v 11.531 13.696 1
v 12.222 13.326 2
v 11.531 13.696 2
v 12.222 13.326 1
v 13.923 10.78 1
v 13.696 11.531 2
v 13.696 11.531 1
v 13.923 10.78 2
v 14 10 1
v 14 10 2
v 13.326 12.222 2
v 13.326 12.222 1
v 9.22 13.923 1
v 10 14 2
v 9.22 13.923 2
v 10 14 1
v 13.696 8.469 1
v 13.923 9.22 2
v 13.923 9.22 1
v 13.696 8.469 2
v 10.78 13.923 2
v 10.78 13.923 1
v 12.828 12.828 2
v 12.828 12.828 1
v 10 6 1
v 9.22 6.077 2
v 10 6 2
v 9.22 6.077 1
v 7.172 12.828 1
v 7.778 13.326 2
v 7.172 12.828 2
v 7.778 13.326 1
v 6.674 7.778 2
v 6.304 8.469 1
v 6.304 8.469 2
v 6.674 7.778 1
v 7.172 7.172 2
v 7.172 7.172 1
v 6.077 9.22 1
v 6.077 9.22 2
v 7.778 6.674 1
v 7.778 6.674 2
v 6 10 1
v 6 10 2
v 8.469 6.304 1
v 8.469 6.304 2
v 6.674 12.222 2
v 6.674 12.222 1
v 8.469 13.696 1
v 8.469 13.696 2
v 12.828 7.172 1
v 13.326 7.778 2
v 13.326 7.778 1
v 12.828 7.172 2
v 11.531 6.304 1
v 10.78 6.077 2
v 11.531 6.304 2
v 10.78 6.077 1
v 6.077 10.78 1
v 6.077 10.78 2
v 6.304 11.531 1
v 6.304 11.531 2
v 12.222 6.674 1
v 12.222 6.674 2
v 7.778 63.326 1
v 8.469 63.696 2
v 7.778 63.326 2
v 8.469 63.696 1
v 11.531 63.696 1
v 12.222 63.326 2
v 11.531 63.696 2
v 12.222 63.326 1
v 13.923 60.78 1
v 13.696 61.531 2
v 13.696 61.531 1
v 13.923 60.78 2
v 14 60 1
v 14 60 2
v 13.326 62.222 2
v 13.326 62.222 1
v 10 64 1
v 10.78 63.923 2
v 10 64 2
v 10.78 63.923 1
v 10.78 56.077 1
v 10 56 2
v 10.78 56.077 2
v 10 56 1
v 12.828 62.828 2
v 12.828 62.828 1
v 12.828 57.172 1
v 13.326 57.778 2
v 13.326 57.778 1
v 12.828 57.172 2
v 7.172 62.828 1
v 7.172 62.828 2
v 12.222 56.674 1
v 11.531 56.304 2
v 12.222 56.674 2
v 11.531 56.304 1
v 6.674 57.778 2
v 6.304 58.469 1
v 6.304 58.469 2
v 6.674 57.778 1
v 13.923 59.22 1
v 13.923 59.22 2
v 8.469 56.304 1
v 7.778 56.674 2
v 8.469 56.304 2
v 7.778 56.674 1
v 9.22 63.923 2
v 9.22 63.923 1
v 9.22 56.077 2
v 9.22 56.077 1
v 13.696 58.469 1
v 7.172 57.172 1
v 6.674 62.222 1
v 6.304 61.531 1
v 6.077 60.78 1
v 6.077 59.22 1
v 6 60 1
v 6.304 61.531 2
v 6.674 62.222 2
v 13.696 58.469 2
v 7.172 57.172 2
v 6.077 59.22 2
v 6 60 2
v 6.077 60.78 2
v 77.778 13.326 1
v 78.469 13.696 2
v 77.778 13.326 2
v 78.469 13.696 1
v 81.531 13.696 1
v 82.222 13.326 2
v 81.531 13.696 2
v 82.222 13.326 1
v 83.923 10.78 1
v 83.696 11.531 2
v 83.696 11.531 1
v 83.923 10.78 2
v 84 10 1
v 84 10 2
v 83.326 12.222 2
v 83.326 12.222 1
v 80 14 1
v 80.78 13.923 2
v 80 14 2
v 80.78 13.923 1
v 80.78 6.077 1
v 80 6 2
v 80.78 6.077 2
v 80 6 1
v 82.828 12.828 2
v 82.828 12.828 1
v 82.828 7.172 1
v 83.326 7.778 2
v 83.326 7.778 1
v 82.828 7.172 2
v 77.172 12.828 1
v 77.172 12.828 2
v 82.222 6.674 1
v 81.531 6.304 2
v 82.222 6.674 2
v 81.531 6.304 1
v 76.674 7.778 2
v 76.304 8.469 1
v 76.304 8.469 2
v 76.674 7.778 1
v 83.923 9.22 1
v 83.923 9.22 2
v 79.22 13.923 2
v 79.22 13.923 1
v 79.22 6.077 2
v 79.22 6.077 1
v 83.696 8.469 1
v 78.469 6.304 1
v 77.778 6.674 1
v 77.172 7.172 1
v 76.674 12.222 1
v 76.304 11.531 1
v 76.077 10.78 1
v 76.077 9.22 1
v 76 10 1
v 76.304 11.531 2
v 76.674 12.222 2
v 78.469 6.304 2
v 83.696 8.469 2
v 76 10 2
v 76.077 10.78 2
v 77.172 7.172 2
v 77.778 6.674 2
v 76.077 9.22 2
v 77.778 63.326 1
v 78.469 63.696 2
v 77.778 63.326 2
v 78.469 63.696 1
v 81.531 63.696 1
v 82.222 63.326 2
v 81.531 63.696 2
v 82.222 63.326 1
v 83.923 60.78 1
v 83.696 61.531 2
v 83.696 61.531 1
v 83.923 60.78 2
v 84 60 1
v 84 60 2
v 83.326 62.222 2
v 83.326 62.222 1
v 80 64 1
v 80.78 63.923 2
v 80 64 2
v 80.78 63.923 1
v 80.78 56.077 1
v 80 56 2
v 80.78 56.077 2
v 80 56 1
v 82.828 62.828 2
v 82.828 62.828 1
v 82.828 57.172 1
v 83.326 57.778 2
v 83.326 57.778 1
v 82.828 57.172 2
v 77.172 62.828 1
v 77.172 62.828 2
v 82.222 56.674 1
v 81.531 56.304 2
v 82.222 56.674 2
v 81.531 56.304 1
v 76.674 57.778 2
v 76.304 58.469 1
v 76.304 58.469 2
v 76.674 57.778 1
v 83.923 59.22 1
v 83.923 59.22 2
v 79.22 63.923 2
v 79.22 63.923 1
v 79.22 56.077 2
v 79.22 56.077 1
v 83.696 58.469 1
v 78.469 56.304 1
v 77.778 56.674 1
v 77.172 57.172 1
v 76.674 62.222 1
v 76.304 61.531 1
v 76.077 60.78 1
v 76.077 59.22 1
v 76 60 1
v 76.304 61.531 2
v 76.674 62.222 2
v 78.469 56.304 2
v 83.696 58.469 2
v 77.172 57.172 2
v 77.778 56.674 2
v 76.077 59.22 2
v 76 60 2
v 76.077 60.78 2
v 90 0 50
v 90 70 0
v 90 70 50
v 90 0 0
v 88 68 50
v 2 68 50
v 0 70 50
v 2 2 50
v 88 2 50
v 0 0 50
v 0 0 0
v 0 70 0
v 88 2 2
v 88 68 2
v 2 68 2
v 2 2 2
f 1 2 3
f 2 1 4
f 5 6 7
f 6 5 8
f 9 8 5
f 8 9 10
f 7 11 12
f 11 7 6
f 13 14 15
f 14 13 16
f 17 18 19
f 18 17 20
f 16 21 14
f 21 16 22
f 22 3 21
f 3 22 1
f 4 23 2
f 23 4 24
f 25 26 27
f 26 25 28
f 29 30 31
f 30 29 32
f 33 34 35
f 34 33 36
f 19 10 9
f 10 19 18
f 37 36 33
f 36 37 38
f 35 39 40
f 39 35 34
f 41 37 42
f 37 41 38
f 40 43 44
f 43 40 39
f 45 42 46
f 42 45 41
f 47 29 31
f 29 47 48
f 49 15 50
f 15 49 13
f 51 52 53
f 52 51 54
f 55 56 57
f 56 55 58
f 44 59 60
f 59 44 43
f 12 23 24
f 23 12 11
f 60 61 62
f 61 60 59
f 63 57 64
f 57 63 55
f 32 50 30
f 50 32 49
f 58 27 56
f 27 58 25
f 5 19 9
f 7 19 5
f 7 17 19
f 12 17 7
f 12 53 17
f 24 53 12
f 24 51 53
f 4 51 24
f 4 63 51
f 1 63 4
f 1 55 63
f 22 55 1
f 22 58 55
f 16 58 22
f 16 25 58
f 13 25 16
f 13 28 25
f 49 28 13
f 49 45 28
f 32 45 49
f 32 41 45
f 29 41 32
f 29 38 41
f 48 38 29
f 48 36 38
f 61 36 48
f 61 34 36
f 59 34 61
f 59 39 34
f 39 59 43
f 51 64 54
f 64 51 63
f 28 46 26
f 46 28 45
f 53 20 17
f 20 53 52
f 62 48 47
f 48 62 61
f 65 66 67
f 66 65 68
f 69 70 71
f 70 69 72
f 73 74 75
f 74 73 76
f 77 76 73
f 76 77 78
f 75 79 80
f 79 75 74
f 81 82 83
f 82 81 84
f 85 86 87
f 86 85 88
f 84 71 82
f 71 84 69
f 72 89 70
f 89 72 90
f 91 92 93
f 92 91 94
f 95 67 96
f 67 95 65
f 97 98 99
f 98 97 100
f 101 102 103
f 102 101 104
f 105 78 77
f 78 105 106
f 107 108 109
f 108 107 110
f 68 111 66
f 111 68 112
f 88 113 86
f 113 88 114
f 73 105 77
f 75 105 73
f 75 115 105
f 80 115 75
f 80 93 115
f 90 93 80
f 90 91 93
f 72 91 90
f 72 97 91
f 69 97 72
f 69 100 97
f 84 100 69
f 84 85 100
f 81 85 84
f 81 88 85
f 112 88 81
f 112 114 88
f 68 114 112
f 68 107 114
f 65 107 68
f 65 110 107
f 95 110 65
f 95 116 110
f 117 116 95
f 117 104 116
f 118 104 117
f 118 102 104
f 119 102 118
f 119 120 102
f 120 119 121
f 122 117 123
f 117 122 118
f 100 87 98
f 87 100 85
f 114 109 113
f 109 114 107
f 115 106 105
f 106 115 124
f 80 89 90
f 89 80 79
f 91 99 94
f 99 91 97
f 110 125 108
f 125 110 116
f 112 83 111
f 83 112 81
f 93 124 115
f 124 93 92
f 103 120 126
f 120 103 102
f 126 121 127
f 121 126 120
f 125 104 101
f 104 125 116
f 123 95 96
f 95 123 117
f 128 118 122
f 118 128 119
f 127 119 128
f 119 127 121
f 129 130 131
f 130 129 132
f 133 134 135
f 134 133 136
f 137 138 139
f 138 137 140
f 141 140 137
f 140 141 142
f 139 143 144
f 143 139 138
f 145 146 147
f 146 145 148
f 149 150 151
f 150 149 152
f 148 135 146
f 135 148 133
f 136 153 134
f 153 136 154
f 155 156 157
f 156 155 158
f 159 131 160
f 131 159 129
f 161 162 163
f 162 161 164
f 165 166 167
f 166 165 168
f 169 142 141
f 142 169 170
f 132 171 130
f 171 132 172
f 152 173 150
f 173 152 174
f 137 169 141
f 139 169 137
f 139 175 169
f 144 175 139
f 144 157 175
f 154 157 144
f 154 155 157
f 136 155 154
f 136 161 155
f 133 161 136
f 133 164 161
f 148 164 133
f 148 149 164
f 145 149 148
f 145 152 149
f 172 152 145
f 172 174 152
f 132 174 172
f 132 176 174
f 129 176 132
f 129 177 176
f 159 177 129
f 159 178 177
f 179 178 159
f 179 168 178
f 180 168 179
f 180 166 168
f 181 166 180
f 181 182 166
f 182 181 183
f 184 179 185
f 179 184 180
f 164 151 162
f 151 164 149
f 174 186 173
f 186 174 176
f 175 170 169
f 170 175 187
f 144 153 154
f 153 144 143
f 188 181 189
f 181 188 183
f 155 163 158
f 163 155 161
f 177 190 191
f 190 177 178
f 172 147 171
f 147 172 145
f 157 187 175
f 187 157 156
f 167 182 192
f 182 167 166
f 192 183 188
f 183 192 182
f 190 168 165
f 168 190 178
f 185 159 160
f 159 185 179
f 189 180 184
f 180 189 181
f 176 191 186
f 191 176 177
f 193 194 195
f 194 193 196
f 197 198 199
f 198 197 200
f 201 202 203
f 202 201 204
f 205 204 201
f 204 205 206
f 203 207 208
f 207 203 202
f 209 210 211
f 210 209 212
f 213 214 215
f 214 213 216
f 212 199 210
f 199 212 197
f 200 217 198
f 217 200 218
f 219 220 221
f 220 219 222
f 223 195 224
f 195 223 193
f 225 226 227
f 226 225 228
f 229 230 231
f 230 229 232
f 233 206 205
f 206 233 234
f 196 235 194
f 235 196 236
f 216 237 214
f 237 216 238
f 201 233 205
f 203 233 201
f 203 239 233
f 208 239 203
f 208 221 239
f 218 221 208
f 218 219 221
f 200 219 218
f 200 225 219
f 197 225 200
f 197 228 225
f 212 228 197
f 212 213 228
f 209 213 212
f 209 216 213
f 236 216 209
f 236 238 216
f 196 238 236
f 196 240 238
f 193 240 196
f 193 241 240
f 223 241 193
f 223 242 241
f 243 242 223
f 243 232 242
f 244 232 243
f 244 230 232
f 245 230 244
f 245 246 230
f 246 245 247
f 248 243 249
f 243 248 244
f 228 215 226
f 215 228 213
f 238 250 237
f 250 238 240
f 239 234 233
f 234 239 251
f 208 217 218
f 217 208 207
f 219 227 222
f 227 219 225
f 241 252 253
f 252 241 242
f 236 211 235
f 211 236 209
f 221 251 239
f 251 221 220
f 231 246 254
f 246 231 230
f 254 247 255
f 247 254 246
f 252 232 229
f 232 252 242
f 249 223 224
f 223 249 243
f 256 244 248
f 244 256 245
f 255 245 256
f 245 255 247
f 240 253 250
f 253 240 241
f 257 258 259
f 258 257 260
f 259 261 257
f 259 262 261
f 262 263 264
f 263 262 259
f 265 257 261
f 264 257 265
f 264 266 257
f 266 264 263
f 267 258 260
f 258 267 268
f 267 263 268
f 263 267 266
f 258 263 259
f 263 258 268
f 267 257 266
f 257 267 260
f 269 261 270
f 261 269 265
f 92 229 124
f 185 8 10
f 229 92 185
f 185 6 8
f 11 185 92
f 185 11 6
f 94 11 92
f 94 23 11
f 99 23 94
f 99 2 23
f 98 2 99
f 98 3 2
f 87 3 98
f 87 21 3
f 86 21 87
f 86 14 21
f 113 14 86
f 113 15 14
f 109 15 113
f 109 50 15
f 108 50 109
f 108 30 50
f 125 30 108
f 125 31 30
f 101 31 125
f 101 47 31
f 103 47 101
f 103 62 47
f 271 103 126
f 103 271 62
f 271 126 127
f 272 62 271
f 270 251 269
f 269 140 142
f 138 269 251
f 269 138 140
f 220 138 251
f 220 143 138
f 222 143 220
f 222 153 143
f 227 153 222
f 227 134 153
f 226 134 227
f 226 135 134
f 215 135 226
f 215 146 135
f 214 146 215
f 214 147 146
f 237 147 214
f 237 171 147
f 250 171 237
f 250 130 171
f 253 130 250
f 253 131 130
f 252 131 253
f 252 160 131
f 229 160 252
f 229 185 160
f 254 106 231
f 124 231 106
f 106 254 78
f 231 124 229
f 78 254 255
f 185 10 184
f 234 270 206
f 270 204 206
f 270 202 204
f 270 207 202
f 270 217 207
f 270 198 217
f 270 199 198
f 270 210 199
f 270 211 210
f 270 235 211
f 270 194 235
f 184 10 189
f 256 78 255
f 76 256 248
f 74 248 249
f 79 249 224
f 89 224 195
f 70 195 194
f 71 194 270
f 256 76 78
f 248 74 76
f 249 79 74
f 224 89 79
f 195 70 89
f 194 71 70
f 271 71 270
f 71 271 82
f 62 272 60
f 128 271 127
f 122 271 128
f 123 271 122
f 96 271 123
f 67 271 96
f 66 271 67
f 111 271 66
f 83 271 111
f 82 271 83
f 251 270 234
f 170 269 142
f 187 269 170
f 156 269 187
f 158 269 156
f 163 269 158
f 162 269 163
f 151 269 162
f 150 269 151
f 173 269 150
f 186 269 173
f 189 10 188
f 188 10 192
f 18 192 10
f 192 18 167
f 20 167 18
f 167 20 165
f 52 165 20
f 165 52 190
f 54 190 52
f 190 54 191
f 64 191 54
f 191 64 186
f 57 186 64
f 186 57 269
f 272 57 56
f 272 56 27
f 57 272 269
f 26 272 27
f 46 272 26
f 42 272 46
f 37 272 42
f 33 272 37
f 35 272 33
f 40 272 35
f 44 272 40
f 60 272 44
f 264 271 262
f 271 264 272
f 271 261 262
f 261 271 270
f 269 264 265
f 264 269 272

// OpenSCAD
$fn = 32;

// ----------------------------------------------------------------------
// Enclosure box: bosses enclosure
// ----------------------------------------------------------------------

// --- parameters (mm) ---
box_l = 90;               // outer length, X
box_w = 70;               // outer width, Y
box_h = 50;               // outer height
wall_t = 2;               // wall thickness
boss_r = 4;               // corner boss radius
hole_r = 1.5;             // boss screw hole radius
boss_in = 10;             // boss inset from the corners
fit_tol = 0.1;            // tolerance for press fits, mm
free_tol = 0.3;           // tolerance for clearance fits, mm

inner_h = box_h - wall_t;  // cavity depth
boss_h = inner_h - 2;  // corner boss height

difference() {
  cube([box_l, box_w, box_h]);
  translate([wall_t, wall_t, wall_t])
    cube([box_l - 2 * wall_t, box_w - 2 * wall_t, box_h]);
  for (sx = [0, 1], sy = [0, 1])
    translate([sx ? box_l - boss_in : boss_in,
               sy ? box_w - boss_in : boss_in, wall_t - 1]) {
      cylinder(r = boss_r, h = boss_h);
      translate([0, 0, boss_h - 4])
        cylinder(r = hole_r, h = 5);
    }
}
